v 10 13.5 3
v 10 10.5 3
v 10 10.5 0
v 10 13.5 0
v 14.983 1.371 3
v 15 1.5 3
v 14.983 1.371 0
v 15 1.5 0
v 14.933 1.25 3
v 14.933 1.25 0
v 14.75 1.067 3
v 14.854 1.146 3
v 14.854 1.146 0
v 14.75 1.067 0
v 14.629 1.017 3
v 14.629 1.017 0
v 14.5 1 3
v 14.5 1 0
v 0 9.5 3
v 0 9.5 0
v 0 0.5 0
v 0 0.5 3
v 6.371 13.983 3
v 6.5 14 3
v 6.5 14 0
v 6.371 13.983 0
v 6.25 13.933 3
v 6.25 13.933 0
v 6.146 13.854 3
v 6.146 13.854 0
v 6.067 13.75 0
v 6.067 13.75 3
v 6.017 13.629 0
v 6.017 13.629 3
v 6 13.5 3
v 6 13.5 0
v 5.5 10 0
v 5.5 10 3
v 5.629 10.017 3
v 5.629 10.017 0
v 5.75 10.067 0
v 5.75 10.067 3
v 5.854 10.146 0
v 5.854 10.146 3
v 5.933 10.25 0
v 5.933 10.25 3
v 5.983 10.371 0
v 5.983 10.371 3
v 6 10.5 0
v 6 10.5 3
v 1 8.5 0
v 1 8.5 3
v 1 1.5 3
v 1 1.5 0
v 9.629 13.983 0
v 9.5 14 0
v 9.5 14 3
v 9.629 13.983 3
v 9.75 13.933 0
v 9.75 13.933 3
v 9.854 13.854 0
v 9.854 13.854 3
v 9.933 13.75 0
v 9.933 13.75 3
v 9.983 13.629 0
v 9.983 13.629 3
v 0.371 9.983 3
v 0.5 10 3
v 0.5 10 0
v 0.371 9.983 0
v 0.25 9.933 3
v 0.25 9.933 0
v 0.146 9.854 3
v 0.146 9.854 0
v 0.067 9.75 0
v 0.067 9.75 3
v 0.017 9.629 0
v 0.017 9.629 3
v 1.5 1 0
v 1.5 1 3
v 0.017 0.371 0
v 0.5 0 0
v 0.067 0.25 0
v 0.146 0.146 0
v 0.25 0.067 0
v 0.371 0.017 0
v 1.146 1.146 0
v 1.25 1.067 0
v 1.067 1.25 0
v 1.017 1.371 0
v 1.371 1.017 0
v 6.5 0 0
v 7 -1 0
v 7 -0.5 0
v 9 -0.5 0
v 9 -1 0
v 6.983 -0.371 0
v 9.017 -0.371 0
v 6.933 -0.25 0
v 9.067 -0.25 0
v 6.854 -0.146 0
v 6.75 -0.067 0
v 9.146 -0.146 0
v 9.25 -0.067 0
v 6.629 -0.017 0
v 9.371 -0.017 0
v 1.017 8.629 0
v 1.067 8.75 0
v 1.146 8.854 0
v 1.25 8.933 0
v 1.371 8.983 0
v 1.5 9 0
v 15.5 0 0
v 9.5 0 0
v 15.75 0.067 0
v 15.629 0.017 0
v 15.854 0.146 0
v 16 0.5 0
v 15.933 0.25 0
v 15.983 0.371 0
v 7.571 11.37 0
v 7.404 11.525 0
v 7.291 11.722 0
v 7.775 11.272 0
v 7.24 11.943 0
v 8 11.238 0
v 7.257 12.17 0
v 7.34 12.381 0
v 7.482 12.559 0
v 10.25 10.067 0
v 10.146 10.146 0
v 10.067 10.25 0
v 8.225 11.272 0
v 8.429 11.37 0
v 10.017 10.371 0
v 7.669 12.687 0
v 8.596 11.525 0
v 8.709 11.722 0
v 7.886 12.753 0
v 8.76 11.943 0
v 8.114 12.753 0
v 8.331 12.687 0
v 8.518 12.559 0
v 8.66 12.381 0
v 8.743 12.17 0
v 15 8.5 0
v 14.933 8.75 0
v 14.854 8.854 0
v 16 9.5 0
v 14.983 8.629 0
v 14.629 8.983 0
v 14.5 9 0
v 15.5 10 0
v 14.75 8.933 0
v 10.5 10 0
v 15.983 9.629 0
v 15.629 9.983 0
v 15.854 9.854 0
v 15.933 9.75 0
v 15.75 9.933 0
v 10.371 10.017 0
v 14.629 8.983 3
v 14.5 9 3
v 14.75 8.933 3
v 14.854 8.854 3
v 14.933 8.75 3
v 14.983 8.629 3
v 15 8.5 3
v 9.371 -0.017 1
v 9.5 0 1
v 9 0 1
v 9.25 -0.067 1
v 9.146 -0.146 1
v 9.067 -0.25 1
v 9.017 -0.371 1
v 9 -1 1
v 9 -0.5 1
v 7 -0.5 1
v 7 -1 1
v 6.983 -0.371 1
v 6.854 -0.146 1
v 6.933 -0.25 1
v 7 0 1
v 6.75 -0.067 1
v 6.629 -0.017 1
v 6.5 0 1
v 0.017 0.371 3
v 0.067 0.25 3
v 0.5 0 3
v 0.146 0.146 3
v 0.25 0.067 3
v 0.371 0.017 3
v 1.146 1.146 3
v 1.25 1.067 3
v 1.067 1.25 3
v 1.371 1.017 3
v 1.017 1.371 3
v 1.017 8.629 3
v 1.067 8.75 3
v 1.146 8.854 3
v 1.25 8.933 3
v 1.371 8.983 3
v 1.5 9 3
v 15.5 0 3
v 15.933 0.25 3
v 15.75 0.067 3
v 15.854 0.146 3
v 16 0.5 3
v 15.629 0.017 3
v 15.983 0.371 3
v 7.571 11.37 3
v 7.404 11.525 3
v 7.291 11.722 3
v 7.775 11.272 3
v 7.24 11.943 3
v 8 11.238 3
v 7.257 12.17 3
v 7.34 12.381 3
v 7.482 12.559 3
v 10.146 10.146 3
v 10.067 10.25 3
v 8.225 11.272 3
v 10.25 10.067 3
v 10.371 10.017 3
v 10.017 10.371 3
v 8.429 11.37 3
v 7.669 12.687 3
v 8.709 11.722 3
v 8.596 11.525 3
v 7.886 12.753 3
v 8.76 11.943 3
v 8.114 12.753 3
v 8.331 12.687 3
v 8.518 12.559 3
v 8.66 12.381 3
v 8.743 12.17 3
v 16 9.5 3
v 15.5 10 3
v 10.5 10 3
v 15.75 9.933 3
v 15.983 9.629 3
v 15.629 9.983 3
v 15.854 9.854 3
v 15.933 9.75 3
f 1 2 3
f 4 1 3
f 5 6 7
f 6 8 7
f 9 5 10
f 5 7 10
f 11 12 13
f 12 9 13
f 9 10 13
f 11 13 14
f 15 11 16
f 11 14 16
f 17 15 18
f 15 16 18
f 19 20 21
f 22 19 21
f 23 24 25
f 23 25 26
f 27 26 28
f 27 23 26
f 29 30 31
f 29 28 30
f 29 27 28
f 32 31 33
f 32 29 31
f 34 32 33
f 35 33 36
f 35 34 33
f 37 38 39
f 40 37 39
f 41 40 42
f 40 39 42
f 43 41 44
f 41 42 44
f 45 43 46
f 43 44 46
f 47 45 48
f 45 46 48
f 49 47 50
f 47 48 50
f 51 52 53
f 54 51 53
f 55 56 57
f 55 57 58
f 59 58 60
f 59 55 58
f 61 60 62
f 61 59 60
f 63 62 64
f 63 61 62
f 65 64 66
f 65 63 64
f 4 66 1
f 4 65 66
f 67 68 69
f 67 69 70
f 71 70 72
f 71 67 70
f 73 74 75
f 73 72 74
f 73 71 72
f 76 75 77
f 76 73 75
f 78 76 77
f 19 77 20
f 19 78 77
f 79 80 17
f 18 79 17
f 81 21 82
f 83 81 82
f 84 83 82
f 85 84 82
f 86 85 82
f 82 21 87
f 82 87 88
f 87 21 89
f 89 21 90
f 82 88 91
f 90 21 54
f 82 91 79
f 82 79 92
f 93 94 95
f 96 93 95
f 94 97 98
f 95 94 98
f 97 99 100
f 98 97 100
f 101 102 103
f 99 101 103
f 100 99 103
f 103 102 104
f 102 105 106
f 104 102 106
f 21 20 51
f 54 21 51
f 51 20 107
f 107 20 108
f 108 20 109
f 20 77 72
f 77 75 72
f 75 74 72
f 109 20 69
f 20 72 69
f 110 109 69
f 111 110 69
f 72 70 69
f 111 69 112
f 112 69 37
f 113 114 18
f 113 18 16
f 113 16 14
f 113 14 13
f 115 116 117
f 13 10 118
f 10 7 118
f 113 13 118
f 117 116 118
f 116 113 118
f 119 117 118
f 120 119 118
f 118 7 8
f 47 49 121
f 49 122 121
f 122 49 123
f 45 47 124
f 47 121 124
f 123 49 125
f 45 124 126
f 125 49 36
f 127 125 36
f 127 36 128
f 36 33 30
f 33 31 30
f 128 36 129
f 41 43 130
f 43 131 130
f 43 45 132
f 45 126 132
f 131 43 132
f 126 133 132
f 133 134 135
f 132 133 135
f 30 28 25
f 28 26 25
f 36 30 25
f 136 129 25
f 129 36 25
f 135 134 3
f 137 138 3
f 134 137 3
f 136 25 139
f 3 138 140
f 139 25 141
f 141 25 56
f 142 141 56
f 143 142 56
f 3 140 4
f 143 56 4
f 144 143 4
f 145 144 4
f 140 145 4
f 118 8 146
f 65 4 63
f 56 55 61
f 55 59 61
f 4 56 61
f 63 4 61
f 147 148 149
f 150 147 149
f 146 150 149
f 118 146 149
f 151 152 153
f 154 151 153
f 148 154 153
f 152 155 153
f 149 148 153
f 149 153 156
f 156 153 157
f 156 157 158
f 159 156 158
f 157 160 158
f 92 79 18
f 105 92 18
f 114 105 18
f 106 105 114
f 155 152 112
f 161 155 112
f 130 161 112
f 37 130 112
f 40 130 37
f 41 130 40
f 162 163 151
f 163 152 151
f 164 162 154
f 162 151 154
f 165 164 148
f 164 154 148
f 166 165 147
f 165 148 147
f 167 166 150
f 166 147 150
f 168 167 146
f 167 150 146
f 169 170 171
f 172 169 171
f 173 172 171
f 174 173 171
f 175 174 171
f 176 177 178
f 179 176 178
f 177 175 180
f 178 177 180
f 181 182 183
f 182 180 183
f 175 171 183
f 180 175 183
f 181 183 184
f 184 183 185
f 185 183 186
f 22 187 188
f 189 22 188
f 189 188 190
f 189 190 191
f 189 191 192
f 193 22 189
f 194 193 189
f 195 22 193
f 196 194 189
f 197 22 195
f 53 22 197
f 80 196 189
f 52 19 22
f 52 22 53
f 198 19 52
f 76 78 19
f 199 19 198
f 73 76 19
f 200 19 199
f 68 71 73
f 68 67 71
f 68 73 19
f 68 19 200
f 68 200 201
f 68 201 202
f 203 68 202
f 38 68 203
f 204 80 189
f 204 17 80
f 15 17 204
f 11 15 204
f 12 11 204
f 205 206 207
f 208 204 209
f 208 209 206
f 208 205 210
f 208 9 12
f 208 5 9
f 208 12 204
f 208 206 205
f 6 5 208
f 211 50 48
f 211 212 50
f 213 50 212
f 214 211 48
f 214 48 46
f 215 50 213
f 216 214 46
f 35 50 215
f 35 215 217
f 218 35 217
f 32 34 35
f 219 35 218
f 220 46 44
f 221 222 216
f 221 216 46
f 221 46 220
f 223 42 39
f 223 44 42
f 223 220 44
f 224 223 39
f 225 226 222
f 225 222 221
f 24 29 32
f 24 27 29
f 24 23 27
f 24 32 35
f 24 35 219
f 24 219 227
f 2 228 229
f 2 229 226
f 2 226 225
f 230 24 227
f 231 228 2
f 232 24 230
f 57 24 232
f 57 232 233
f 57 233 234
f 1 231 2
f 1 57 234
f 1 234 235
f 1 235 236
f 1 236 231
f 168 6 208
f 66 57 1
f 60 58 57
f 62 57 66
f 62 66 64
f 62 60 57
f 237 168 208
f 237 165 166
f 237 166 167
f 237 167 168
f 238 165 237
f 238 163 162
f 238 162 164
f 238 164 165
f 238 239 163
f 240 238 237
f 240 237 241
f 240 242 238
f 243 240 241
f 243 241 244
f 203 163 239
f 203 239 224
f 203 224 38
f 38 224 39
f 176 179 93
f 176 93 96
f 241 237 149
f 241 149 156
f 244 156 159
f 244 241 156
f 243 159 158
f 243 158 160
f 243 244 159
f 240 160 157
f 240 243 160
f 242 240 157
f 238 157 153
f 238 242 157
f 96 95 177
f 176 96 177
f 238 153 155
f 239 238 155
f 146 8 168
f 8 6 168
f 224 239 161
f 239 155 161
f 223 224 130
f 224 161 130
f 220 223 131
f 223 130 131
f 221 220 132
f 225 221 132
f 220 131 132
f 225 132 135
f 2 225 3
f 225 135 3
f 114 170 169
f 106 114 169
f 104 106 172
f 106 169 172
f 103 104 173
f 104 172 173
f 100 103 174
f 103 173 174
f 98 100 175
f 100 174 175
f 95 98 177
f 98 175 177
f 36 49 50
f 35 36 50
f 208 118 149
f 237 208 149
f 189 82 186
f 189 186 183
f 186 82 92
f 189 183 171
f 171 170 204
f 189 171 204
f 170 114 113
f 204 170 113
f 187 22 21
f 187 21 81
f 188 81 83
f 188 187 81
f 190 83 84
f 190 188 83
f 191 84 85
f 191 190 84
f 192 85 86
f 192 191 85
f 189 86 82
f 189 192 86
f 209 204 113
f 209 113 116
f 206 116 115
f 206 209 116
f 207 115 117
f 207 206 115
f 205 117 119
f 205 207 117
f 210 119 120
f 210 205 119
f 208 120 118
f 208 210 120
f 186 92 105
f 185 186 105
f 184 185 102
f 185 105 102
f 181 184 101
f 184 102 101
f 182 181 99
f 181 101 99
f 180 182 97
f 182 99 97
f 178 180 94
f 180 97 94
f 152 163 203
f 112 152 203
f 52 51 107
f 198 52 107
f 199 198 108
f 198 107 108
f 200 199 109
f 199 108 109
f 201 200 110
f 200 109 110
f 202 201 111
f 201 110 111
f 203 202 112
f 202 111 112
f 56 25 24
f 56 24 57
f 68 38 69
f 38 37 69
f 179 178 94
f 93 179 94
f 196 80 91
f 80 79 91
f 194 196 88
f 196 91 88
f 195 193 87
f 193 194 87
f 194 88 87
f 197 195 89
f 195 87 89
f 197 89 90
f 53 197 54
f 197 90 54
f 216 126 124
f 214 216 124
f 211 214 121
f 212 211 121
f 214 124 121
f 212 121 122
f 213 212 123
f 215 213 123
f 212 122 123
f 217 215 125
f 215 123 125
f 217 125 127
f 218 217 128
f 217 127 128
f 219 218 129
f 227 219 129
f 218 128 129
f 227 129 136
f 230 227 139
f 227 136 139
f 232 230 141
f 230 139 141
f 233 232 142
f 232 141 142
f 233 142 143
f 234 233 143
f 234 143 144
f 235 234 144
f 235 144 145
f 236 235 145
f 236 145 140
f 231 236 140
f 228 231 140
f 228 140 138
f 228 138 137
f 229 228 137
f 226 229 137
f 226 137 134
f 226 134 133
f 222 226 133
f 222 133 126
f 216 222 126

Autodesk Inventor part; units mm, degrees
ref_plane "YZ Plane" through (0, 0, 0) normal (1, 0, 0) x (0, 1, 0)
ref_plane "XZ Plane" through (0, 0, 0) normal (0, 1, 0) x (-1, 0, 0)
ref_plane "XY Plane" through (0, 0, 0) normal (0, 0, 1) x (1, 0, 0)
sketch "Sketch1" plane through (0, 0, 0) normal (0, 0, 1) x (1, 0, 0)
  line L0 (0, 0) -> (16, 0)
  line L1 (16, 0) -> (16, 10)
  line L2 (16, 10) -> (0, 10)
  line L3 (0, 10) -> (0, 0)
  dimension "d0" = 16
  dimension "d1" = 10
extrude "Extrusion1" add sketch "Sketch1" along normal blind 3
sketch "Sketch2" plane through (0, 0, 3) normal (0, 0, 1) x (1, 0, 0)
  line L0 (1, 1) -> (15, 1)
  line L1 (15, 1) -> (15, 9)
  line L2 (15, 9) -> (1, 9)
  line L3 (1, 9) -> (1, 1)
  dimension "d4" = 14
  dimension "d5" = 8
extrude "Extrusion2" cut sketch "Sketch2" against normal through all
sketch "Sketch3" plane through (0, 10, 0) normal (0, 1, 0) x (1, 0, 0)
  line L0 (0, -3) -> (16, -3) projected
  line L1 (16, 0) -> (0, 0) projected
  line L2 (0, 0) -> (0, -3) projected
  line L3 (6, -3) -> (10, -3)
  line L4 (10, -3) -> (10, 0)
  line L5 (10, 0) -> (6, 0)
  line L6 (6, 0) -> (6, -3)
  dimension "d13" = 4
  dimension "d14" = 6
extrude "Extrusion3" add sketch "Sketch3" along normal blind 4 contours L6 L1 L4 L0
sketch "Sketch6" plane through (0, 0, 3) normal (0, 0, 1) x (1, 0, 0)
  point P0 (8, 12)
hole "Hole1" at (8, 12, 3) direction (0, 0, -1) diameter 1.524 end through all
thread "Thread1" size "0-80 UNF" class "2B" standard "ANSI Unified Screw Threads" full length
sketch "Sketch7" plane through (0, 0, 0) normal (0, -1, 0) x (1, 0, 0)
  line L0 (0, 0) -> (0, 3) projected
  line L1 (0, 0) -> (16, 0) projected
  line L2 (7, 0) -> (9, 0)
  line L3 (9, 0) -> (9, 1)
  line L4 (9, 1) -> (7, 1)
  line L5 (7, 1) -> (7, 0)
  dimension "d29" = 2
  dimension "d30" = 1
  dimension "d31" = 7
extrude "Extrusion5" add sketch "Sketch7" along normal blind 1
fillet "Fillet2" radius 0.5 14 edges at (1, 9, 1.5) (15, 9, 1.5) (15, 1, 1.5) (1, 1, 1.5) (10, 10, 1.5) (6, 10, 1.5) (6, 14, 1.5) (10, 14, 1.5) (16, 10, 1.5) (16, 0, 1.5) (0, 0, 1.5) (0, 10, 1.5) (7, 0, 0.5) (9, 0, 0.5)
properties part number "base"
